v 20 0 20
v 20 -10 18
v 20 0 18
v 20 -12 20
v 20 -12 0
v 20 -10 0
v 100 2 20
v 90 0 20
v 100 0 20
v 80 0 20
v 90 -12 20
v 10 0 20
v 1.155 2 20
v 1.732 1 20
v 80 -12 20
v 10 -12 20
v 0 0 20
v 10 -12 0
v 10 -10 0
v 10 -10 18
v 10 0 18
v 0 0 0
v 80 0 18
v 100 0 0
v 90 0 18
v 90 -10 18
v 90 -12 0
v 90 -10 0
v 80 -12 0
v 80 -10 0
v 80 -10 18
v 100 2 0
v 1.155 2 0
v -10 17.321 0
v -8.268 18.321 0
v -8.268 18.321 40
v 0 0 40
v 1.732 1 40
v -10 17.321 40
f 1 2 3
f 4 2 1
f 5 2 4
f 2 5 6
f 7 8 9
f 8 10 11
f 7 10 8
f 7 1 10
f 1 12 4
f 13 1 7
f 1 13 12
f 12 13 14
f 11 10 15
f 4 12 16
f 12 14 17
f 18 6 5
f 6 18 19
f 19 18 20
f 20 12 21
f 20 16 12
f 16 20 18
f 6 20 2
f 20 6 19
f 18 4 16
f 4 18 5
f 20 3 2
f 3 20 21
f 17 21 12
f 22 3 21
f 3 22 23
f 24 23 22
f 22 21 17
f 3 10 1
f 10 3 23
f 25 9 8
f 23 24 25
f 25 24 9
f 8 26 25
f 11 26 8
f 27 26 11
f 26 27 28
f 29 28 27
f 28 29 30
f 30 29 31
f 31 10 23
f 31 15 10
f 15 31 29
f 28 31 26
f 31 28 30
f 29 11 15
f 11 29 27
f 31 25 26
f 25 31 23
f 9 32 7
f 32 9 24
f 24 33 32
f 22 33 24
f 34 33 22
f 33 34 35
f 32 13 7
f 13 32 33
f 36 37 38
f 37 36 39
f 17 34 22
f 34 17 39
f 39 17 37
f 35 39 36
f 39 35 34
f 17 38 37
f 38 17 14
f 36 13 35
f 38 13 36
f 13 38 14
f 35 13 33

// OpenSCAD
cube([100,2,20]);
rotate([0,0,30])
  cube([2,20,40]);
translate([0,-12,0])
{
  for (offset = [10,80])
  {
    translate([offset,0,0])
    {
      cube([10,2,20]);
      translate([0,0,20-2])
        cube([10,12,2]);
    }
  }
}
